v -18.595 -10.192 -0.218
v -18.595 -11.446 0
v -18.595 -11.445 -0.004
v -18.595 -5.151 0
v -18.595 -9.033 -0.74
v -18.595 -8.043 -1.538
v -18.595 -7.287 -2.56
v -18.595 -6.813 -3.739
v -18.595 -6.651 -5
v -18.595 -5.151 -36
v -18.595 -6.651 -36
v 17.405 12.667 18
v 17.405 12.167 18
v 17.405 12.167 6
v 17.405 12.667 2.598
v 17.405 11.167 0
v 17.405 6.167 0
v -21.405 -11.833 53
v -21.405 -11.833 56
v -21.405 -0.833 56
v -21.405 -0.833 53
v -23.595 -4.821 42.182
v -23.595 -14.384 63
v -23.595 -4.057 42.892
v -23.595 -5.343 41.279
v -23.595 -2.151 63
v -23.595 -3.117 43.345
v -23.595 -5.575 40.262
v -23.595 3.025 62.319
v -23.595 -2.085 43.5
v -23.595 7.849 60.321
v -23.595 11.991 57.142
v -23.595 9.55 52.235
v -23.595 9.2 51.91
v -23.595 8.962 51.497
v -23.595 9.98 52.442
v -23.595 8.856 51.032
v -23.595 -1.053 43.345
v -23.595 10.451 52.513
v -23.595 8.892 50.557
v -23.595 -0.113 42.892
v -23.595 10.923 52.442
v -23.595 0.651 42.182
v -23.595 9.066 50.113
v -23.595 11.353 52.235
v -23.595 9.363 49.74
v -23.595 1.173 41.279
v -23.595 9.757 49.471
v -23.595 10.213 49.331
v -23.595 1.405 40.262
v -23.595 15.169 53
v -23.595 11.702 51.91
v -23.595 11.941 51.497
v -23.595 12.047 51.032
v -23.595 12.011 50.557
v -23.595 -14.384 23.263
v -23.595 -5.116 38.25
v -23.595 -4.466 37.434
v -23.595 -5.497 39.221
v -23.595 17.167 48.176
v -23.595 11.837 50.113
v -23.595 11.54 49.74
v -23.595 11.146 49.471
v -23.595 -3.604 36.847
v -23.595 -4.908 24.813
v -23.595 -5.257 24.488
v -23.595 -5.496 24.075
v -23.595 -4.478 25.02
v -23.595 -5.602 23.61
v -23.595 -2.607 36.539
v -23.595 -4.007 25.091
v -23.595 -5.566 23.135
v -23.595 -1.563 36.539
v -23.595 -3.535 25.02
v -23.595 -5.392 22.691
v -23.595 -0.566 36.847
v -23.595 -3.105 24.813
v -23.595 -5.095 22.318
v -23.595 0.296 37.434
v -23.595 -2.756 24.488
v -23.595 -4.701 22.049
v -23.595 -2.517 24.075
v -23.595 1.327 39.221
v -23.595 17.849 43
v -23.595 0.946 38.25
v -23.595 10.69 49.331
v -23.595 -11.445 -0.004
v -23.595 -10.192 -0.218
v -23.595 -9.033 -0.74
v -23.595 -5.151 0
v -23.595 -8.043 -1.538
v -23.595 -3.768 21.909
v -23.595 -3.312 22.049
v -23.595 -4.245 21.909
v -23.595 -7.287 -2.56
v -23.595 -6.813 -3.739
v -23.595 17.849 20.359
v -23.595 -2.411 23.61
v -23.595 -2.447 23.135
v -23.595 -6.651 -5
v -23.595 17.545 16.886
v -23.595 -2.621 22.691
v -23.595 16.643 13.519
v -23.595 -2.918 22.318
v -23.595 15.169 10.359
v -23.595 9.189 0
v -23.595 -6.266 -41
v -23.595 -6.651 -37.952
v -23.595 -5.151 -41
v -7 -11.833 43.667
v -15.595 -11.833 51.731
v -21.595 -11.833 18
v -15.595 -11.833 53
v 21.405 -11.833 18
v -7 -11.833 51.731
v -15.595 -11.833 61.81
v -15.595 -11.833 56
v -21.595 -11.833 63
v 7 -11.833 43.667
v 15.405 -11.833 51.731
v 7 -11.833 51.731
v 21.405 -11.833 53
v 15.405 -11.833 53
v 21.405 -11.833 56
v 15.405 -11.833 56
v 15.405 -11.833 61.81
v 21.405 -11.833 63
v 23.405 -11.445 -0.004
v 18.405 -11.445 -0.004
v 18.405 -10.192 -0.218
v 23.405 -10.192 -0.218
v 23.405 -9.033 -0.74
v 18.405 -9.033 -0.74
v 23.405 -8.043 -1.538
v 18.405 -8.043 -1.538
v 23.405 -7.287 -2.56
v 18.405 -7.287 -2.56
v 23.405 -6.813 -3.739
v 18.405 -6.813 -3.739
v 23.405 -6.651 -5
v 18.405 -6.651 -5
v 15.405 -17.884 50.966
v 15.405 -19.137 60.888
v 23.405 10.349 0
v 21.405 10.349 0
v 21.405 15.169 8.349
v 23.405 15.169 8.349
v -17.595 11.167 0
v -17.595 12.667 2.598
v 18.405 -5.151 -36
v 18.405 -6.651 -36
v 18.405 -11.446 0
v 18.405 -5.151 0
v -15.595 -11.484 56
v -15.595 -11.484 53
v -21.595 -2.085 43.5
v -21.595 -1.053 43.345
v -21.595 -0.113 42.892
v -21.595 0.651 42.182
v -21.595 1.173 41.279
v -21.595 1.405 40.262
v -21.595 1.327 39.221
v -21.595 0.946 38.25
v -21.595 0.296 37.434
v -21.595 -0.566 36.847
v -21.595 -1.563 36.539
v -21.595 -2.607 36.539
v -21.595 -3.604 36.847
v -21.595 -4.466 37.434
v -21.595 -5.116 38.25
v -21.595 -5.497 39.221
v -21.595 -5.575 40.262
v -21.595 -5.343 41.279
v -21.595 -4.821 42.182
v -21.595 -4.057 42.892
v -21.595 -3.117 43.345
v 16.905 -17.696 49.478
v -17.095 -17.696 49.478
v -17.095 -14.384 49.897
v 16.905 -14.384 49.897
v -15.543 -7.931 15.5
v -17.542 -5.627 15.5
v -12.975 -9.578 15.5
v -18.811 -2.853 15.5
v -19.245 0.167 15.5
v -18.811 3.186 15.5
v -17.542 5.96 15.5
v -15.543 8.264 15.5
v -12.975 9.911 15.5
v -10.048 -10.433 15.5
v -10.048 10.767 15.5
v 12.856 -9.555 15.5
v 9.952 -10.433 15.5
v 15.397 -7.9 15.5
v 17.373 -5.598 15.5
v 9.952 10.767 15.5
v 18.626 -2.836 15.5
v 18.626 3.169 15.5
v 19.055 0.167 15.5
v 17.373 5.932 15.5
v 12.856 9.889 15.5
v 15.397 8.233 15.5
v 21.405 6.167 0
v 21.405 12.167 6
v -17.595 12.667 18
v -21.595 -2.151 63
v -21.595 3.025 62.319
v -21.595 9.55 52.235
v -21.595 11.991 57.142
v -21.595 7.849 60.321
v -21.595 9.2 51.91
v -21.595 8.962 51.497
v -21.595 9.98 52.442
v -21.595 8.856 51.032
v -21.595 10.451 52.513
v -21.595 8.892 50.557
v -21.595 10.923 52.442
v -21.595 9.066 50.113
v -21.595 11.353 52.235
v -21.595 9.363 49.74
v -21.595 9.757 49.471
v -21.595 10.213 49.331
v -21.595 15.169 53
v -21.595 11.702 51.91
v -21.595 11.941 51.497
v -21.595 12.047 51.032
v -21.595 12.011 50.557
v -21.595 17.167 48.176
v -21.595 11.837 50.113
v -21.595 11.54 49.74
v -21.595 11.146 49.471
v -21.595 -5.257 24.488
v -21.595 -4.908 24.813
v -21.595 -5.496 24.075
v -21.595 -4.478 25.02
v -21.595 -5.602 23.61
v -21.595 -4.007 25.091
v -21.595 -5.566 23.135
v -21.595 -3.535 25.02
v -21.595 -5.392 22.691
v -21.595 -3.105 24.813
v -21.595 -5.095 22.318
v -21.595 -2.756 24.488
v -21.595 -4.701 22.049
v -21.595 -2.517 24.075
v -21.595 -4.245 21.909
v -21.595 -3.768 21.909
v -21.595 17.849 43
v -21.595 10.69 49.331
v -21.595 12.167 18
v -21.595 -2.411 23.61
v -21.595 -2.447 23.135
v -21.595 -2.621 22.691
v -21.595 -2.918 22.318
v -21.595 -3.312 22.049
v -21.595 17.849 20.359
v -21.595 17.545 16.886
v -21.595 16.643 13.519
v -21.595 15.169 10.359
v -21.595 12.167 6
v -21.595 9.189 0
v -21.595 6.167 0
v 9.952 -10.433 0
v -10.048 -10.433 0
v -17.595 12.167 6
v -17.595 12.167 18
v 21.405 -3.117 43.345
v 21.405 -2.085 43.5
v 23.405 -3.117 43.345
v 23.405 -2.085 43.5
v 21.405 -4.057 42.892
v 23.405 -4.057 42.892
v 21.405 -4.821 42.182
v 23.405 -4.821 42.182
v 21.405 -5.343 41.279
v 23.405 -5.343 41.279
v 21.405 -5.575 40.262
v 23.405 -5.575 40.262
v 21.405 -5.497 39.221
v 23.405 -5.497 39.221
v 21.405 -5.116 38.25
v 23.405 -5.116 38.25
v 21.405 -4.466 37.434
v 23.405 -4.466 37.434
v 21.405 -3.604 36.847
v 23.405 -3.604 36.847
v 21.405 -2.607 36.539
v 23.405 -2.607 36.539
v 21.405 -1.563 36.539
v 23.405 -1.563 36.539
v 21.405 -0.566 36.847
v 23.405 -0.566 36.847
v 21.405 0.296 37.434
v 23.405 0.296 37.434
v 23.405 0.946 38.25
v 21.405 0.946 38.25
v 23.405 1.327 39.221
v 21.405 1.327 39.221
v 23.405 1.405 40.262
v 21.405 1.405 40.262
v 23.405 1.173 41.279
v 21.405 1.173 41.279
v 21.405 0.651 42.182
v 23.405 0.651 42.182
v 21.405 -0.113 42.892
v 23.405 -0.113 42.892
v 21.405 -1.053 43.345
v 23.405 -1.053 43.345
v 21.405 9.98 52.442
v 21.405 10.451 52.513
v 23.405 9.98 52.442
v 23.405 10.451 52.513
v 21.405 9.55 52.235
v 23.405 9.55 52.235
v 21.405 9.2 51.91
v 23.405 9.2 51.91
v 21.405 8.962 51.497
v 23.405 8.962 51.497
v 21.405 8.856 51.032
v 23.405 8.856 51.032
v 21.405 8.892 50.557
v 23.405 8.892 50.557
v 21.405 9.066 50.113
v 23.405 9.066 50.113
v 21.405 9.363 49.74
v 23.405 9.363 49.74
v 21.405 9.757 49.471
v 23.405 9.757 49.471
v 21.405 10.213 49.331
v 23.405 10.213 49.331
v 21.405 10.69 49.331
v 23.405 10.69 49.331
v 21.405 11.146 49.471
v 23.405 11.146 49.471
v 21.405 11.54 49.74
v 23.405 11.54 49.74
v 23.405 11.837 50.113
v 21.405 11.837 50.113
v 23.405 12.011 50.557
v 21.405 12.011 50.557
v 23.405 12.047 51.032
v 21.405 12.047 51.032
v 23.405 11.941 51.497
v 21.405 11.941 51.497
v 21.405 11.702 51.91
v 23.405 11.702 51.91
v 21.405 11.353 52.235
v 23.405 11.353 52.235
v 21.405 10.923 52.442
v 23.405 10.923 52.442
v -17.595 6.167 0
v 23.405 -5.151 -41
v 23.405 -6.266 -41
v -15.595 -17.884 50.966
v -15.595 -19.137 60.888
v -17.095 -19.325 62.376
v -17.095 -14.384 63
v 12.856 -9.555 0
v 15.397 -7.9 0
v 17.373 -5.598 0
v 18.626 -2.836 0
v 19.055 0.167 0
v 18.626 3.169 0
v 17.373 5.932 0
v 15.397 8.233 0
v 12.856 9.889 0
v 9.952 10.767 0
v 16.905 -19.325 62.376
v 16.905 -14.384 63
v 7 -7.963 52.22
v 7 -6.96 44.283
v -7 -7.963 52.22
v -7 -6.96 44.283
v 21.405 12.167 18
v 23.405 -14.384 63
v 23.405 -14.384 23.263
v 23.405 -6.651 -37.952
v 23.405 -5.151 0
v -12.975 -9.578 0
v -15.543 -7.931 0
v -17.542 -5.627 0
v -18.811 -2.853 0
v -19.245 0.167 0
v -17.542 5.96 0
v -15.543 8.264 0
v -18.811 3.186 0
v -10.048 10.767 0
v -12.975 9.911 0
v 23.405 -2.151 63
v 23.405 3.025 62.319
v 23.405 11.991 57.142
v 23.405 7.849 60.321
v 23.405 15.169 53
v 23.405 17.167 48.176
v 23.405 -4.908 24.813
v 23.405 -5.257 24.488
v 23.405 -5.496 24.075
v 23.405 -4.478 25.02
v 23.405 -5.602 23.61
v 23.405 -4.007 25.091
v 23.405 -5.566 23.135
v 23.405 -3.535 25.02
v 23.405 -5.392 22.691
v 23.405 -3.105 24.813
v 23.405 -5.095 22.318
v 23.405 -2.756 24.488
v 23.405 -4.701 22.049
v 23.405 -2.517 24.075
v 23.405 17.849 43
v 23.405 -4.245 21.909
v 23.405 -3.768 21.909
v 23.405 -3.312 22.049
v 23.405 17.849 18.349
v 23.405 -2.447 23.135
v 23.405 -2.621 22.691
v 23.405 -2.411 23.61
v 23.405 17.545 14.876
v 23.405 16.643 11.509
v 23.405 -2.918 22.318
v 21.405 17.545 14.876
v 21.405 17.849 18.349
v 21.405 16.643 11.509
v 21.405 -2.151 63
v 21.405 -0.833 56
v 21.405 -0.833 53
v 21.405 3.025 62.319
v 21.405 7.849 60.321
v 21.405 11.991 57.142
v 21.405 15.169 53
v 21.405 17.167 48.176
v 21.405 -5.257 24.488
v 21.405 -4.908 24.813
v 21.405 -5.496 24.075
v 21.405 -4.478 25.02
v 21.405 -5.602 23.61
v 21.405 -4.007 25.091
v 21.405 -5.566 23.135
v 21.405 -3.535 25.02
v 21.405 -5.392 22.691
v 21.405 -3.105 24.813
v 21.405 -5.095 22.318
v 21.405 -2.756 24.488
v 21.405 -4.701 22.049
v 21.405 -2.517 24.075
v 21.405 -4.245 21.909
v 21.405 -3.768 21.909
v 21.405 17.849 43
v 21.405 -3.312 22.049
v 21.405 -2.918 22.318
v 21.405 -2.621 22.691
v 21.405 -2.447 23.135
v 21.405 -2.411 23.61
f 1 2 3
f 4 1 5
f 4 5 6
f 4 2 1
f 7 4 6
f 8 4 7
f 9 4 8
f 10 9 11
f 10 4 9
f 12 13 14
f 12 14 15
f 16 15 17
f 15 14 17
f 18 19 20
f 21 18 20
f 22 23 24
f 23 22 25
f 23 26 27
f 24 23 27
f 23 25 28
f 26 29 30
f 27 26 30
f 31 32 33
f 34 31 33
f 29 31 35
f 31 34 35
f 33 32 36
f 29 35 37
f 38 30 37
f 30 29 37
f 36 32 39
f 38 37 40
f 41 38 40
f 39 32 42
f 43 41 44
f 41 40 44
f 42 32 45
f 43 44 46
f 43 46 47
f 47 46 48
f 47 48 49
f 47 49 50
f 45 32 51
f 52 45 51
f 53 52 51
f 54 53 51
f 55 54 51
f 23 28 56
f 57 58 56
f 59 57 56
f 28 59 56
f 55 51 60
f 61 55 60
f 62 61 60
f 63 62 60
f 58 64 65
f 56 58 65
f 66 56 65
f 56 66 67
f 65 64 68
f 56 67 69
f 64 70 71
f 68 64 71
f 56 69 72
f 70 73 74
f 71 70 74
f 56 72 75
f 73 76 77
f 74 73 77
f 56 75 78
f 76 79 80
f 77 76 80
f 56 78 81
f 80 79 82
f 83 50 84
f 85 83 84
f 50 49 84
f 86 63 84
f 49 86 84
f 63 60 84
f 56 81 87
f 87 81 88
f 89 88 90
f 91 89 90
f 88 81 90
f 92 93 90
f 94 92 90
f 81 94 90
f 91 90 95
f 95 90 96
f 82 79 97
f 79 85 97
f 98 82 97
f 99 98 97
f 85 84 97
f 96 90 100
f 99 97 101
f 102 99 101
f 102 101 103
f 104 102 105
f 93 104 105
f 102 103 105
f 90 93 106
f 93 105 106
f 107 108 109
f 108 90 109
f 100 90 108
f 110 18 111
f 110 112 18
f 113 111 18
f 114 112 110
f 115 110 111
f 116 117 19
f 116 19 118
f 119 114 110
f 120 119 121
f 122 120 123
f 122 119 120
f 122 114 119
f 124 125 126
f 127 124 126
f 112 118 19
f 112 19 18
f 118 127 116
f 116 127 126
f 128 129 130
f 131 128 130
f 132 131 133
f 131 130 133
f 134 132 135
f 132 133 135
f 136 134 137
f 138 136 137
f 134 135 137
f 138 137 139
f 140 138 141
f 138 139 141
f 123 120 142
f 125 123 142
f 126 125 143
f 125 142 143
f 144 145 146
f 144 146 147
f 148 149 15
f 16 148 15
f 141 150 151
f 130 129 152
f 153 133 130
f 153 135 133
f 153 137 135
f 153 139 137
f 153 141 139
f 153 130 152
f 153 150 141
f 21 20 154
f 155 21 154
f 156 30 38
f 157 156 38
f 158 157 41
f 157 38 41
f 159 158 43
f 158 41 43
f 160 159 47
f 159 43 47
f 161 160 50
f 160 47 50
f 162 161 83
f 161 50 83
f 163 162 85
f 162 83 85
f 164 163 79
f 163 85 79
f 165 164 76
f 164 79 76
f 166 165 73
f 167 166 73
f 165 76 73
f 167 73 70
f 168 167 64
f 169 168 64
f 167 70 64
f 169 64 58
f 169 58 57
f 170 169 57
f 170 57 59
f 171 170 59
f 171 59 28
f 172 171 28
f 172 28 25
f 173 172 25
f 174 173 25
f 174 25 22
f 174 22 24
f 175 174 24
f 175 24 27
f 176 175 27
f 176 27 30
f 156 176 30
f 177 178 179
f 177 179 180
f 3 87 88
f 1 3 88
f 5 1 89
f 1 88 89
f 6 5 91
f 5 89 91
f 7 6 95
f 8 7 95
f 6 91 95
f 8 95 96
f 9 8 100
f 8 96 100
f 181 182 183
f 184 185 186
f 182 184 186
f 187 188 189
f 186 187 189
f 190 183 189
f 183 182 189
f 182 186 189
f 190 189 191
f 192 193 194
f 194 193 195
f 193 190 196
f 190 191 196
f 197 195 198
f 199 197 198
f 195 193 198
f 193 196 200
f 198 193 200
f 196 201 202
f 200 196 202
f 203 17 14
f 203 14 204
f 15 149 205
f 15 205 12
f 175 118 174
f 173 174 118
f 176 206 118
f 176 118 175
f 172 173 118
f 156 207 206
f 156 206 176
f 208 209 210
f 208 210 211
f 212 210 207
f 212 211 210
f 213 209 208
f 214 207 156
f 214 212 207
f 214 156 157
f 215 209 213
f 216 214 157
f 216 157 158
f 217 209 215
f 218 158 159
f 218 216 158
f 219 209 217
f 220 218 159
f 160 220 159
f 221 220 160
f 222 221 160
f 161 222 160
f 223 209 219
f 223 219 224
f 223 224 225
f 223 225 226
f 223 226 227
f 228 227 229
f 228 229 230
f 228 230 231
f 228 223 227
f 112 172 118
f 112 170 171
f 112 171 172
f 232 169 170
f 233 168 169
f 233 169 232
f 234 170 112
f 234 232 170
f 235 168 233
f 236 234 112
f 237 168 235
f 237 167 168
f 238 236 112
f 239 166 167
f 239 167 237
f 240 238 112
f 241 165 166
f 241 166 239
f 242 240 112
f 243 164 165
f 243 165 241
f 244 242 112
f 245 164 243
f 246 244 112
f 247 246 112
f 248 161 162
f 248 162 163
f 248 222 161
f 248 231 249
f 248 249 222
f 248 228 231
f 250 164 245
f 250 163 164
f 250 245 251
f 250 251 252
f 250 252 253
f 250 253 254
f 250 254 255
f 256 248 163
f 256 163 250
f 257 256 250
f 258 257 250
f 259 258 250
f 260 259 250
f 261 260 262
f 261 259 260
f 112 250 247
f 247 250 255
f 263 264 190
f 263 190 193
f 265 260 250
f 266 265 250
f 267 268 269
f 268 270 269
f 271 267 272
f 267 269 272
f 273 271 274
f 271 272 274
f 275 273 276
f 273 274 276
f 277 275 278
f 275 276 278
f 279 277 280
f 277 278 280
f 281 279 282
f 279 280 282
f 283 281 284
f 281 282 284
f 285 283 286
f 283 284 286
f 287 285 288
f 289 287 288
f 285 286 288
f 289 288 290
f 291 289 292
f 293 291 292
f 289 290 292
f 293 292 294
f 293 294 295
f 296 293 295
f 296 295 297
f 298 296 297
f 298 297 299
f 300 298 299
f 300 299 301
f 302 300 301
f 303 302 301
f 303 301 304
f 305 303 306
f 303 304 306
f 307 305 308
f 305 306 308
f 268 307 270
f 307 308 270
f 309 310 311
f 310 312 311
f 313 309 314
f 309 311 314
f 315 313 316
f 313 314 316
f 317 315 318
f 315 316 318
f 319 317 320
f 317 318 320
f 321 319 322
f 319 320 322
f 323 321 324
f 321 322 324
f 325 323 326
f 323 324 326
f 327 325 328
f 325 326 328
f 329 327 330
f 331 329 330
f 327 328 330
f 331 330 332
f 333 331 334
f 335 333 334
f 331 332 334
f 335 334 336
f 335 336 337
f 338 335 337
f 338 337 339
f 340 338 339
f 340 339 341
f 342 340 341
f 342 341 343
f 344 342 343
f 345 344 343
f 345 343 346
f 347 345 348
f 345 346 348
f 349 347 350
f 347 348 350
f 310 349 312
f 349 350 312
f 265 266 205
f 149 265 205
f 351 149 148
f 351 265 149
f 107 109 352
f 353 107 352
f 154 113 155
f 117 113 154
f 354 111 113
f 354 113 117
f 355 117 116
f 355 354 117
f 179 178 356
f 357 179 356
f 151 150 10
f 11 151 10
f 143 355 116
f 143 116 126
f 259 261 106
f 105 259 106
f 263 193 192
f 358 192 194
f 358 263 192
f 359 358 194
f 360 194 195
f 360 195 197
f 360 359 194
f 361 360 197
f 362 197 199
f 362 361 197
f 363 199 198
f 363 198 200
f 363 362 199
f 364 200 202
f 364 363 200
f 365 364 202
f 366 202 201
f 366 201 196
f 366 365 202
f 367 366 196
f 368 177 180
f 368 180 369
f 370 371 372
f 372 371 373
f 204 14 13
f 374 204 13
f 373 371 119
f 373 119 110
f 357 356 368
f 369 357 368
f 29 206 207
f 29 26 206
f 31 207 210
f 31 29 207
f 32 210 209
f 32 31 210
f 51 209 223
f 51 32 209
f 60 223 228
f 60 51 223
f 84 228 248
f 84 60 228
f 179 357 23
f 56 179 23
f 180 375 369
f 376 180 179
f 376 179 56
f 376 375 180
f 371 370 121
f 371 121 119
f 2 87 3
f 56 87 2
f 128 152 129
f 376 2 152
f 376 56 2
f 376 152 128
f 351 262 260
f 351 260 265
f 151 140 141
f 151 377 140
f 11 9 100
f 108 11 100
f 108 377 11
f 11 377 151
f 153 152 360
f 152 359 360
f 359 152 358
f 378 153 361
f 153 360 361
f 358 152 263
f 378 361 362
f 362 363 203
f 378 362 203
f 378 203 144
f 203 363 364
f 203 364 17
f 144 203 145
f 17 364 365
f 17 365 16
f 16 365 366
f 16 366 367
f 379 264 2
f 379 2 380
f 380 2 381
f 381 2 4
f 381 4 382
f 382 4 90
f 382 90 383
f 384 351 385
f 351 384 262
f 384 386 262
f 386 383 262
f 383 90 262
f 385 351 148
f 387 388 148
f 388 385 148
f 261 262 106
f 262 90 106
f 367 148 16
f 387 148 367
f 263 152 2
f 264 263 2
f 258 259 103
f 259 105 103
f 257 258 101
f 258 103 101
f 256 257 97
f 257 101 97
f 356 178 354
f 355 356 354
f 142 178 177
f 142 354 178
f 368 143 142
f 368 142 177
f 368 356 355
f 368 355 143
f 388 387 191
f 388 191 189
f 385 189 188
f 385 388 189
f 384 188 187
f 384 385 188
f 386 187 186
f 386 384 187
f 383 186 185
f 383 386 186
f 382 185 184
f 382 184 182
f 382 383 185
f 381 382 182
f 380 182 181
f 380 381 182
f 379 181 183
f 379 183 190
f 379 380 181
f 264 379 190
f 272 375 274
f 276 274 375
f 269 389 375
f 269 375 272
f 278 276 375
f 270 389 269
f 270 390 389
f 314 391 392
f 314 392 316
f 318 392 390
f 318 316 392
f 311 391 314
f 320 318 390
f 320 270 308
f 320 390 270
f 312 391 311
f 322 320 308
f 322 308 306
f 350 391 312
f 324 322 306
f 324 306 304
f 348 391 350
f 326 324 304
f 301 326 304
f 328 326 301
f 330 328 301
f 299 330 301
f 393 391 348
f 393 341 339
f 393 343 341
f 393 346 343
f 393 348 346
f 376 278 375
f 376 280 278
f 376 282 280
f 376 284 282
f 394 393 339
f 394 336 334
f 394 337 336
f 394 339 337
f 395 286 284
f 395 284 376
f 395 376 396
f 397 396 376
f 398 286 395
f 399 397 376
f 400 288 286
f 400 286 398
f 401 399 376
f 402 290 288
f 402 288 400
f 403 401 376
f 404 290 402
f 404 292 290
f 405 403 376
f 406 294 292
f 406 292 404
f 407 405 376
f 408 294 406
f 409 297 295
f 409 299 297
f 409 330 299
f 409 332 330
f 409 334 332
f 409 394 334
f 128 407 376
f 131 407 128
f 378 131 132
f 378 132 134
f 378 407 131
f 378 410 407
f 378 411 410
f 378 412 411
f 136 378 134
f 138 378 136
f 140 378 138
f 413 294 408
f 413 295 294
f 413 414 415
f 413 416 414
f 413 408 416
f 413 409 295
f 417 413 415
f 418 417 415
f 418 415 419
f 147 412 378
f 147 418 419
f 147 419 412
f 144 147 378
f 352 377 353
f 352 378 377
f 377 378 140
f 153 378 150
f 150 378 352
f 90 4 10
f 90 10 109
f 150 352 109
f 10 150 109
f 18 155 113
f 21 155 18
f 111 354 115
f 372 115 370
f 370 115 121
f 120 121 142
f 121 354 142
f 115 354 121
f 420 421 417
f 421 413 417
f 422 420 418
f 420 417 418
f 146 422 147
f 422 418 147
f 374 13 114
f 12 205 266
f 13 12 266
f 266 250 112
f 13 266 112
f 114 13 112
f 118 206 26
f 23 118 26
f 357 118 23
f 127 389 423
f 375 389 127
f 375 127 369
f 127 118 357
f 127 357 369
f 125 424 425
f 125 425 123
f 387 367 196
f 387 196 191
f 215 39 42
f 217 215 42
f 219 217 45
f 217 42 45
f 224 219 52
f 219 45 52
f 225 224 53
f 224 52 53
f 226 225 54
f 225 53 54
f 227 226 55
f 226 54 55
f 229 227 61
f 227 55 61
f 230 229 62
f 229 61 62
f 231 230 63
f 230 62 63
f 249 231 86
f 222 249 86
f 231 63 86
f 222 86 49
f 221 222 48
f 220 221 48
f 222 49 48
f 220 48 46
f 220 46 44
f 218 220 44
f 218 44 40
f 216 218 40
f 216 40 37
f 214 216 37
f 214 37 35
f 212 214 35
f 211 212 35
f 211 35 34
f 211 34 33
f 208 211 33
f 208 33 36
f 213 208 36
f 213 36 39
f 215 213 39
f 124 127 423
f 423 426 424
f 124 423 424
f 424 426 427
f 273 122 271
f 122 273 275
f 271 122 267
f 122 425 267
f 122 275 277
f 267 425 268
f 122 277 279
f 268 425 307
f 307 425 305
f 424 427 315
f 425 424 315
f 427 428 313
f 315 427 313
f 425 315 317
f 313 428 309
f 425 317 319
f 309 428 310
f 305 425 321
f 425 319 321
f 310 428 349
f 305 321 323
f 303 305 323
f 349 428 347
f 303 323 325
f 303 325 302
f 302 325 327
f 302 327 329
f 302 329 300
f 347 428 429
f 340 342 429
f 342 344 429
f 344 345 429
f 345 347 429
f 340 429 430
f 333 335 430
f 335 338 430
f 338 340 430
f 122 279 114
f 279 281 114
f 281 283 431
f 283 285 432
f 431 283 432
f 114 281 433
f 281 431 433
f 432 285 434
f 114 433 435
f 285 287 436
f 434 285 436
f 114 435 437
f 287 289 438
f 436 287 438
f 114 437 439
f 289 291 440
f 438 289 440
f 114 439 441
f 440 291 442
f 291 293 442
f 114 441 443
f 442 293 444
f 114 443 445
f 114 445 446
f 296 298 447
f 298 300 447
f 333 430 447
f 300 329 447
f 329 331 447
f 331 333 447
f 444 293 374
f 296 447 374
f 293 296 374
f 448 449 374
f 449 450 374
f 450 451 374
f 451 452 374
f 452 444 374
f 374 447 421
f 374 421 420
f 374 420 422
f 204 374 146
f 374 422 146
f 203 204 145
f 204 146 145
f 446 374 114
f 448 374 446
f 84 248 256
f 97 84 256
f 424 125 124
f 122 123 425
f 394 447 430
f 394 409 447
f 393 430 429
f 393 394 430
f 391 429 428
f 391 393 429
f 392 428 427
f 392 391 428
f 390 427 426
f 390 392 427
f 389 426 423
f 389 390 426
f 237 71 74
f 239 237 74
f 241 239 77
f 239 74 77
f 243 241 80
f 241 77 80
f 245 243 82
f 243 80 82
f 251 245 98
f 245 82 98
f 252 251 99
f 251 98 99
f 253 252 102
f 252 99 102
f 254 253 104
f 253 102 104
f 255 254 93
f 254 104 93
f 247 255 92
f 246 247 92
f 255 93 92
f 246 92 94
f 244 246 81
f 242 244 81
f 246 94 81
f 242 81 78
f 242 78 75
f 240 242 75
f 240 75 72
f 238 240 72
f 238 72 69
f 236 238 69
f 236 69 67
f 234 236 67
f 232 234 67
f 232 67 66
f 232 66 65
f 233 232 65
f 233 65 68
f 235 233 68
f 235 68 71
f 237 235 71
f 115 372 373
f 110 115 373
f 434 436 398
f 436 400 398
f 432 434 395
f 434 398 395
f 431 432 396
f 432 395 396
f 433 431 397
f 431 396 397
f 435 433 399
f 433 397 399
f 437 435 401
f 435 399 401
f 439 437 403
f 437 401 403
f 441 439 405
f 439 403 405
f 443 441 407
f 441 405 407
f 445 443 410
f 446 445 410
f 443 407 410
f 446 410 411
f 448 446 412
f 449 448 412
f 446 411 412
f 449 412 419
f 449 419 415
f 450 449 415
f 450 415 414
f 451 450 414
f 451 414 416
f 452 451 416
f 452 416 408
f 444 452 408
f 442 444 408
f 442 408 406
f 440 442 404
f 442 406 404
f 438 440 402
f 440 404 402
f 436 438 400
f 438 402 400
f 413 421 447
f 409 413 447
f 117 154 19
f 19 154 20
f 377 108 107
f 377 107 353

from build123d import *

# Parameters (mm, degrees)
EXTRUDE_1_DEPTH          = 15.5
SKETCH_2_W               = 41
SKETCH_2_H               = 24
EXTRUDE_2_DEPTH          = 2.5
EXTRUDE_3_DEPTH          = 41
EXTRUDE_5_DEPTH          = 1
EXTRUDE_6_DEPTH          = 1
EXTRUDE_7_DEPTH          = 2
CUT_EXTRUDE_1_REACH      = 81.452
SKETCH_10_R              = 1.6
SKETCH_10_R_2            = 3.5
EXTRUDE_8_DEPTH          = 2
CUT_EXTRUDE_2_REACH      = 82.601
SKETCH_12_R              = 3.5
SKETCH_12_R_2            = 1.6
EXTRUDE_9_DEPTH          = 43
EXTRUDE_10_DEPTH         = 3
EXTRUDE_11_DEPTH         = 1.5
FILLET_1_R               = 5
SKETCH_21_W              = 35
SKETCH_21_H              = 18
EXTRUDE_12_DEPTH         = 0.5
CHAMFER_1_SIZE           = 6
CUT_EXTRUDE_4_DEPTH      = 10
CUT_EXTRUDE_4_DEPTH_BACK = 0.7
SKETCH_24_W              = 99.76929375
SKETCH_24_H              = 144.1272379
CHAMFER_2_SIZE           = 15
CHAMFER_2_SIZE2          = 8.660254038
CHAMFER_3_SIZE           = 7.5
CHAMFER_3_SIZE2          = 12.990381057
CHAMFER_4_SIZE           = 1.5
CHAMFER_4_SIZE2          = 2.598076211
EXTRUDE_13_REACH         = 76.53
SKETCH_25_W              = 34
SKETCH_25_H              = 13
CUT_EXTRUDE_5_REACH      = 76.53
SKETCH_26_W              = 31
SKETCH_26_H              = 10
EXTRUDE_14_REACH         = 72.111
SKETCH_27_W              = 14
SKETCH_27_H              = 8
FILLET_2_R               = 20
FILLET_3_R               = 20


with BuildPart() as part:
    # ｽｹｯﾁ1 → ﾎﾞｽ - 押し出し1 (new body)
    with BuildSketch(Plane.XY):
        Polygon((10.055611053, 12.166632755), (-10.143634653, 12.166632755), (-20.595217471, 12.166632755), (-20.595217471, -0.083367245), (-20.595217471, -11.833367245), (-10.143634653, -11.833367245), (10.055611053, -11.833367245), (20.404782529, -11.833367245), (20.404782529, 0.125988678), (20.404782529, 12.166632755), align=None)
        with BuildLine():
            Line((9.95247038, 10.766632755), (-10.04752962, 10.766632755))
            ThreePointArc((-10.04752962, 10.766632755), (-19.245217471, 0.166632755), (-10.04752962, -10.433367245))
            Line((-10.04752962, -10.433367245), (9.95247038, -10.433367245))
            ThreePointArc((9.95247038, -10.433367245), (19.054782529, 0.166632755), (9.95247038, 10.766632755))
        make_face(mode=Mode.SUBTRACT)
    extrude(amount=EXTRUDE_1_DEPTH)

    # ｽｹｯﾁ2 → ﾎﾞｽ - 押し出し2 (add)
    with BuildSketch(Plane.XY.offset(15.5)):
        with Locations((-0.095217471, 0.166632755)):
            Rectangle(SKETCH_2_W, SKETCH_2_H)
    extrude(amount=EXTRUDE_2_DEPTH)

    # ｽｹｯﾁ3 → ﾎﾞｽ - 押し出し3 (add)
    with BuildSketch(Plane.ZY.offset(20.595217471)):
        Polygon((0, -12.15110343), (17.677739562, -14.384321281), (18, -11.833367245), (0, -11.833367245), align=None)
    extrude(amount=-EXTRUDE_3_DEPTH)

    # ｽｹｯﾁ5 → ﾎﾞｽ - 押し出し5 (add)
    with BuildSketch(Plane.ZY.offset(20.595217471)):
        Polygon((0, 12.166632755), (0, -12.15110343), (17.677739562, -14.384321281), (18, -11.833367245), (18, 12.166632755), align=None)
    extrude(amount=EXTRUDE_5_DEPTH)

    # ｽｹｯﾁ7 → ﾎﾞｽ - 押し出し6 (add)
    with BuildSketch(Plane(origin=(20.404782529, 0, 0), x_dir=(0, 0, -1), z_dir=(1, 0, 0))):
        Polygon((0, -12.15110343), (0, 12.166632755), (-18, 12.166632755), (-18, -11.833367245), (-17.677739562, -14.384321281), align=None)
    extrude(amount=EXTRUDE_6_DEPTH)

    # ｽｹｯﾁ8 → ﾎﾞｽ - 押し出し7 (add)
    with BuildSketch(Plane.ZY.offset(21.595217471)):
        Polygon((63, 0.066632755), (63, -14.384321281), (17.677739562, -14.384321281), (0, -12.15110343), (0, 12.166632755), (0, 17.84889657), (48, 17.84889657), (63, 17.84889657), align=None)
    extrude(amount=EXTRUDE_7_DEPTH)

    # ｽｹｯﾁ10 → ｶｯﾄ - 押し出し1 (cut, up to next)
    with BuildSketch(Plane.ZY.offset(23.595217471), mode=Mode.PRIVATE) as cut_extrude_1_sk1:
        with Locations((23.490675042, -4.00656608)):
            Circle(SKETCH_10_R)
    cut_extrude_1_tool1 = extrude(cut_extrude_1_sk1.sketch, amount=-CUT_EXTRUDE_1_REACH, mode=Mode.PRIVATE) & part.part
    # ｽｹｯﾁ10 → ｶｯﾄ - 押し出し1 (cut, up to next)
    with BuildSketch(Plane.ZY.offset(23.595217471), mode=Mode.PRIVATE) as cut_extrude_1_sk2:
        with Locations((50.912685274, 10.451419771)):
            Circle(SKETCH_10_R)
    cut_extrude_1_tool2 = extrude(cut_extrude_1_sk2.sketch, amount=-CUT_EXTRUDE_1_REACH, mode=Mode.PRIVATE) & part.part
    # ｽｹｯﾁ10 → ｶｯﾄ - 押し出し1 (cut, up to next)
    with BuildSketch(Plane.ZY.offset(23.595217471), mode=Mode.PRIVATE) as cut_extrude_1_sk3:
        with Locations((40, -2.085059006)):
            Circle(SKETCH_10_R_2)
    cut_extrude_1_tool3 = extrude(cut_extrude_1_sk3.sketch, amount=-CUT_EXTRUDE_1_REACH, mode=Mode.PRIVATE) & part.part
    add(cut_extrude_1_tool1.solids().sort_by_distance((-23.595217, -4.006566, 23.490675))[0], mode=Mode.SUBTRACT)
    add(cut_extrude_1_tool2.solids().sort_by_distance((-23.595217, 10.45142, 50.912685))[0], mode=Mode.SUBTRACT)
    add(cut_extrude_1_tool3.solids().sort_by_distance((-23.595217, -2.085059, 40))[0], mode=Mode.SUBTRACT)

    # ｽｹｯﾁ11 → ﾎﾞｽ - 押し出し8 (add)
    with BuildSketch(Plane(origin=(21.404782529, 0, 0), x_dir=(0, 0, -1), z_dir=(1, 0, 0))):
        Polygon((-63, -14.384321281), (-17.677739562, -14.384321281), (0, -12.15110343), (0, 17.84889657), (-63, 17.84889657), align=None)
    extrude(amount=EXTRUDE_8_DEPTH)

    # ｽｹｯﾁ12 → ｶｯﾄ - 押し出し2 (cut, up to next)
    with BuildSketch(Plane(origin=(23.404782529, 0, 0), x_dir=(0, 0, -1), z_dir=(1, 0, 0)), mode=Mode.PRIVATE) as cut_extrude_2_sk1:
        with Locations(Location((-40, -2.085059006, 0), (0, 0, 180))):
            Circle(SKETCH_12_R)
    cut_extrude_2_tool1 = extrude(cut_extrude_2_sk1.sketch, amount=-CUT_EXTRUDE_2_REACH, mode=Mode.PRIVATE) & part.part
    # ｽｹｯﾁ12 → ｶｯﾄ - 押し出し2 (cut, up to next)
    with BuildSketch(Plane(origin=(23.404782529, 0, 0), x_dir=(0, 0, -1), z_dir=(1, 0, 0)), mode=Mode.PRIVATE) as cut_extrude_2_sk2:
        with Locations(Location((-50.912685274, 10.451419771, 0), (0, 0, 180))):
            Circle(SKETCH_12_R_2)
    cut_extrude_2_tool2 = extrude(cut_extrude_2_sk2.sketch, amount=-CUT_EXTRUDE_2_REACH, mode=Mode.PRIVATE) & part.part
    # ｽｹｯﾁ12 → ｶｯﾄ - 押し出し2 (cut, up to next)
    with BuildSketch(Plane(origin=(23.404782529, 0, 0), x_dir=(0, 0, -1), z_dir=(1, 0, 0)), mode=Mode.PRIVATE) as cut_extrude_2_sk3:
        with Locations(Location((-23.490675042, -4.00656608, 0), (0, 0, 180))):
            Circle(SKETCH_12_R_2)
    cut_extrude_2_tool3 = extrude(cut_extrude_2_sk3.sketch, amount=-CUT_EXTRUDE_2_REACH, mode=Mode.PRIVATE) & part.part
    add(cut_extrude_2_tool1.solids().sort_by_distance((23.404783, -2.085059, 40))[0], mode=Mode.SUBTRACT)
    add(cut_extrude_2_tool2.solids().sort_by_distance((23.404783, 10.45142, 50.912685))[0], mode=Mode.SUBTRACT)
    add(cut_extrude_2_tool3.solids().sort_by_distance((23.404783, -4.006566, 23.490675))[0], mode=Mode.SUBTRACT)

    # ｽｹｯﾁ13 → ﾎﾞｽ - 押し出し9 (add)
    with BuildSketch(Plane.ZY.offset(-21.404782529)):
        Polygon((17.677739562, -14.384321281), (18, -11.833367245), (63, -11.833367245), (63, -14.384321281), align=None)
    extrude(amount=EXTRUDE_9_DEPTH)

    # ｽｹｯﾁ18 → ﾎﾞｽ - 押し出し10 (add)
    with BuildSketch(Plane.XY.offset(56)):
        Polygon((21.404782529, -0.833367245), (15.404782529, -11.833367245), (21.404782529, -11.833367245), align=None)
    extrude_10 = extrude(amount=-EXTRUDE_10_DEPTH)

    # ﾐﾗｰ2: ﾎﾞｽ - 押し出し10 across plane
    add(extrude_10.mirror(Plane(origin=(0, 0, 0), x_dir=(0, 0, 1), z_dir=(1, 0, 0))))

    # ｽｹｯﾁ20 → ﾎﾞｽ - 押し出し11 (add)
    with BuildSketch(Plane(origin=(0, -5.15110343, 0), x_dir=(1, 0, 0), z_dir=(0, 1, 0))):
        Polygon((23.404782529, 0), (18.404782529, 0), (18.404782529, 5), (18.404782529, 36), (-18.595217471, 36), (-18.595217471, 5), (-18.595217471, 0), (-23.595217471, 0), (-23.595217471, 41), (23.404782529, 41), align=None)
    extrude(amount=-EXTRUDE_11_DEPTH)

    # ﾌｨﾚｯﾄ1
    fillet_1_edges = [part.edges().sort_by_distance(p)[0] for p in [
        (20.904782529, -6.65110343, 0),
        (-21.095217471, -6.65110343, 0),
    ]]
    fillet(fillet_1_edges, radius=FILLET_1_R)

    # ｽｹｯﾁ21 → ﾎﾞｽ - 押し出し12 (add)
    with BuildSketch(Plane(origin=(0, 12.166632755, 0), x_dir=(1, 0, 0), z_dir=(0, 1, 0))):
        with Locations((-0.095217471, -9)):
            Rectangle(SKETCH_21_W, SKETCH_21_H)
    extrude(amount=EXTRUDE_12_DEPTH)

    # 面取り1
    chamfer_1_edges = [part.edges().sort_by_distance(p)[0] for p in [
        (19.404782529, 12.166632755, 0),
        (-19.595217471, 12.166632755, 0),
    ]]
    chamfer(chamfer_1_edges, length=CHAMFER_1_SIZE)

    # ｽｹｯﾁ24 → ｶｯﾄ - 押し出し4 (cut, two sides: drawn at the far end of the back side and taken through both)
    with BuildSketch(Plane(origin=(0, -11.960228801, -1.51092827), x_dir=(1, 0, 0), z_dir=(0, -0.9921147013144787, -0.12533323356429749)).offset(-CUT_EXTRUDE_4_DEPTH_BACK)):
        with Locations((0, 9.634165713)):
            Rectangle(SKETCH_24_W, SKETCH_24_H)
    extrude(amount=CUT_EXTRUDE_4_DEPTH + CUT_EXTRUDE_4_DEPTH_BACK, mode=Mode.SUBTRACT)

    # 面取り2
    chamfer_2_edges = [part.edges().sort_by_distance(p)[0] for p in [
        (-22.595217471, 17.84889657, 0),
    ]]
    chamfer_2_side = [part.faces().sort_by_distance(p)[0] for p in [
        (-22.595217471, 17.84889657, 31.5),
    ]]
    chamfer(chamfer_2_edges, length=CHAMFER_2_SIZE, length2=CHAMFER_2_SIZE2, reference=chamfer_2_side[0])

    # 面取り3
    chamfer_3_edges = [part.edges().sort_by_distance(p)[0] for p in [
        (22.404782529, 17.84889657, 0),
    ]]
    chamfer_3_side = [part.faces().sort_by_distance(p)[0] for p in [
        (-23.041397644, 2.018769551, 0),
    ]]
    chamfer(chamfer_3_edges, length=CHAMFER_3_SIZE, length2=CHAMFER_3_SIZE2, reference=chamfer_3_side[0])

    # 面取り4
    chamfer_4_edges = [part.edges().sort_by_distance(p)[0] for p in [
        (-0.095217471, 12.666632755, 0),
    ]]
    chamfer_4_side = [part.faces().sort_by_distance(p)[0] for p in [
        (22.876540457, 2.59889657, 0),
    ]]
    chamfer(chamfer_4_edges, length=CHAMFER_4_SIZE, length2=CHAMFER_4_SIZE2, reference=chamfer_4_side[0])

    # ｽｹｯﾁ25 → ﾎﾞｽ - 押し出し13 (add, up to next)
    with BuildSketch(Plane(origin=(0, -11.26574851, -1.423195007), x_dir=(1, 0, 0), z_dir=(0, -0.9921147013144788, -0.12533323356429746)), mode=Mode.PRIVATE) as extrude_13_sk1:
        with Locations((-0.095217471, 57.806059682)):
            Rectangle(SKETCH_25_W, SKETCH_25_H)
    extrude_13_tool1 = extrude(extrude_13_sk1.sketch, amount=-EXTRUDE_13_REACH, mode=Mode.PRIVATE) - part.part
    add(extrude_13_tool1.solids().sort_by_distance((-0.095217, -18.510769, 55.927047))[0])

    # ｽｹｯﾁ26 → ｶｯﾄ - 押し出し5 (cut, up to next)
    with BuildSketch(Plane(origin=(0, -11.26574851, -1.423195007), x_dir=(1, 0, 0), z_dir=(0, -0.9921147013144788, -0.1253332335642974)), mode=Mode.PRIVATE) as cut_extrude_5_sk1:
        with Locations((-0.095217471, 57.806059682)):
            Rectangle(SKETCH_26_W, SKETCH_26_H)
    cut_extrude_5_tool1 = extrude(cut_extrude_5_sk1.sketch, amount=-CUT_EXTRUDE_5_REACH, mode=Mode.PRIVATE) & part.part
    add(cut_extrude_5_tool1.solids().sort_by_distance((-0.095217, -18.510769, 55.927047))[0], mode=Mode.SUBTRACT)

    # ﾎﾞｽ - 押し出し14: up to this plane
    extrude_14_end = Plane(origin=(-66.989211101, -11.833367245, 18), z_dir=(0, -1, 0))
    # ｽｹｯﾁ27 → ﾎﾞｽ - 押し出し14 (add, up to the surface)
    with BuildSketch(Plane(origin=(0, -1.344601497, -0.169862671), x_dir=(-1, 0, 0), z_dir=(0, -0.9921147013144788, -0.1253332335642974)), mode=Mode.PRIVATE) as extrude_14_sk1:
        with Locations((0, -48.806059682)):
            Rectangle(SKETCH_27_W, SKETCH_27_H)
    extrude_14_tool1 = split(extrude(extrude_14_sk1.sketch, amount=EXTRUDE_14_REACH, mode=Mode.PRIVATE), bisect_by=extrude_14_end, keep=Keep.BOTH, mode=Mode.PRIVATE)
    add(extrude_14_tool1.solids().sort_by_distance((0, -7.461623, 48.251347))[0])

    # ﾌｨﾚｯﾄ2
    fillet_2_edges = [part.edges().sort_by_distance(p)[0] for p in [
        (-22.595217471, 17.84889657, 63),
        (22.404782529, 17.84889657, 63),
    ]]
    fillet(fillet_2_edges, radius=FILLET_2_R)

    # ﾌｨﾚｯﾄ3
    fillet_3_edges = [part.edges().sort_by_distance(p)[0] for p in [
        (-22.595217471, 17.84889657, 15),
        (22.404782529, 17.84889657, 12.990381057),
    ]]
    fillet(fillet_3_edges, radius=FILLET_3_R)


solid = part.part
